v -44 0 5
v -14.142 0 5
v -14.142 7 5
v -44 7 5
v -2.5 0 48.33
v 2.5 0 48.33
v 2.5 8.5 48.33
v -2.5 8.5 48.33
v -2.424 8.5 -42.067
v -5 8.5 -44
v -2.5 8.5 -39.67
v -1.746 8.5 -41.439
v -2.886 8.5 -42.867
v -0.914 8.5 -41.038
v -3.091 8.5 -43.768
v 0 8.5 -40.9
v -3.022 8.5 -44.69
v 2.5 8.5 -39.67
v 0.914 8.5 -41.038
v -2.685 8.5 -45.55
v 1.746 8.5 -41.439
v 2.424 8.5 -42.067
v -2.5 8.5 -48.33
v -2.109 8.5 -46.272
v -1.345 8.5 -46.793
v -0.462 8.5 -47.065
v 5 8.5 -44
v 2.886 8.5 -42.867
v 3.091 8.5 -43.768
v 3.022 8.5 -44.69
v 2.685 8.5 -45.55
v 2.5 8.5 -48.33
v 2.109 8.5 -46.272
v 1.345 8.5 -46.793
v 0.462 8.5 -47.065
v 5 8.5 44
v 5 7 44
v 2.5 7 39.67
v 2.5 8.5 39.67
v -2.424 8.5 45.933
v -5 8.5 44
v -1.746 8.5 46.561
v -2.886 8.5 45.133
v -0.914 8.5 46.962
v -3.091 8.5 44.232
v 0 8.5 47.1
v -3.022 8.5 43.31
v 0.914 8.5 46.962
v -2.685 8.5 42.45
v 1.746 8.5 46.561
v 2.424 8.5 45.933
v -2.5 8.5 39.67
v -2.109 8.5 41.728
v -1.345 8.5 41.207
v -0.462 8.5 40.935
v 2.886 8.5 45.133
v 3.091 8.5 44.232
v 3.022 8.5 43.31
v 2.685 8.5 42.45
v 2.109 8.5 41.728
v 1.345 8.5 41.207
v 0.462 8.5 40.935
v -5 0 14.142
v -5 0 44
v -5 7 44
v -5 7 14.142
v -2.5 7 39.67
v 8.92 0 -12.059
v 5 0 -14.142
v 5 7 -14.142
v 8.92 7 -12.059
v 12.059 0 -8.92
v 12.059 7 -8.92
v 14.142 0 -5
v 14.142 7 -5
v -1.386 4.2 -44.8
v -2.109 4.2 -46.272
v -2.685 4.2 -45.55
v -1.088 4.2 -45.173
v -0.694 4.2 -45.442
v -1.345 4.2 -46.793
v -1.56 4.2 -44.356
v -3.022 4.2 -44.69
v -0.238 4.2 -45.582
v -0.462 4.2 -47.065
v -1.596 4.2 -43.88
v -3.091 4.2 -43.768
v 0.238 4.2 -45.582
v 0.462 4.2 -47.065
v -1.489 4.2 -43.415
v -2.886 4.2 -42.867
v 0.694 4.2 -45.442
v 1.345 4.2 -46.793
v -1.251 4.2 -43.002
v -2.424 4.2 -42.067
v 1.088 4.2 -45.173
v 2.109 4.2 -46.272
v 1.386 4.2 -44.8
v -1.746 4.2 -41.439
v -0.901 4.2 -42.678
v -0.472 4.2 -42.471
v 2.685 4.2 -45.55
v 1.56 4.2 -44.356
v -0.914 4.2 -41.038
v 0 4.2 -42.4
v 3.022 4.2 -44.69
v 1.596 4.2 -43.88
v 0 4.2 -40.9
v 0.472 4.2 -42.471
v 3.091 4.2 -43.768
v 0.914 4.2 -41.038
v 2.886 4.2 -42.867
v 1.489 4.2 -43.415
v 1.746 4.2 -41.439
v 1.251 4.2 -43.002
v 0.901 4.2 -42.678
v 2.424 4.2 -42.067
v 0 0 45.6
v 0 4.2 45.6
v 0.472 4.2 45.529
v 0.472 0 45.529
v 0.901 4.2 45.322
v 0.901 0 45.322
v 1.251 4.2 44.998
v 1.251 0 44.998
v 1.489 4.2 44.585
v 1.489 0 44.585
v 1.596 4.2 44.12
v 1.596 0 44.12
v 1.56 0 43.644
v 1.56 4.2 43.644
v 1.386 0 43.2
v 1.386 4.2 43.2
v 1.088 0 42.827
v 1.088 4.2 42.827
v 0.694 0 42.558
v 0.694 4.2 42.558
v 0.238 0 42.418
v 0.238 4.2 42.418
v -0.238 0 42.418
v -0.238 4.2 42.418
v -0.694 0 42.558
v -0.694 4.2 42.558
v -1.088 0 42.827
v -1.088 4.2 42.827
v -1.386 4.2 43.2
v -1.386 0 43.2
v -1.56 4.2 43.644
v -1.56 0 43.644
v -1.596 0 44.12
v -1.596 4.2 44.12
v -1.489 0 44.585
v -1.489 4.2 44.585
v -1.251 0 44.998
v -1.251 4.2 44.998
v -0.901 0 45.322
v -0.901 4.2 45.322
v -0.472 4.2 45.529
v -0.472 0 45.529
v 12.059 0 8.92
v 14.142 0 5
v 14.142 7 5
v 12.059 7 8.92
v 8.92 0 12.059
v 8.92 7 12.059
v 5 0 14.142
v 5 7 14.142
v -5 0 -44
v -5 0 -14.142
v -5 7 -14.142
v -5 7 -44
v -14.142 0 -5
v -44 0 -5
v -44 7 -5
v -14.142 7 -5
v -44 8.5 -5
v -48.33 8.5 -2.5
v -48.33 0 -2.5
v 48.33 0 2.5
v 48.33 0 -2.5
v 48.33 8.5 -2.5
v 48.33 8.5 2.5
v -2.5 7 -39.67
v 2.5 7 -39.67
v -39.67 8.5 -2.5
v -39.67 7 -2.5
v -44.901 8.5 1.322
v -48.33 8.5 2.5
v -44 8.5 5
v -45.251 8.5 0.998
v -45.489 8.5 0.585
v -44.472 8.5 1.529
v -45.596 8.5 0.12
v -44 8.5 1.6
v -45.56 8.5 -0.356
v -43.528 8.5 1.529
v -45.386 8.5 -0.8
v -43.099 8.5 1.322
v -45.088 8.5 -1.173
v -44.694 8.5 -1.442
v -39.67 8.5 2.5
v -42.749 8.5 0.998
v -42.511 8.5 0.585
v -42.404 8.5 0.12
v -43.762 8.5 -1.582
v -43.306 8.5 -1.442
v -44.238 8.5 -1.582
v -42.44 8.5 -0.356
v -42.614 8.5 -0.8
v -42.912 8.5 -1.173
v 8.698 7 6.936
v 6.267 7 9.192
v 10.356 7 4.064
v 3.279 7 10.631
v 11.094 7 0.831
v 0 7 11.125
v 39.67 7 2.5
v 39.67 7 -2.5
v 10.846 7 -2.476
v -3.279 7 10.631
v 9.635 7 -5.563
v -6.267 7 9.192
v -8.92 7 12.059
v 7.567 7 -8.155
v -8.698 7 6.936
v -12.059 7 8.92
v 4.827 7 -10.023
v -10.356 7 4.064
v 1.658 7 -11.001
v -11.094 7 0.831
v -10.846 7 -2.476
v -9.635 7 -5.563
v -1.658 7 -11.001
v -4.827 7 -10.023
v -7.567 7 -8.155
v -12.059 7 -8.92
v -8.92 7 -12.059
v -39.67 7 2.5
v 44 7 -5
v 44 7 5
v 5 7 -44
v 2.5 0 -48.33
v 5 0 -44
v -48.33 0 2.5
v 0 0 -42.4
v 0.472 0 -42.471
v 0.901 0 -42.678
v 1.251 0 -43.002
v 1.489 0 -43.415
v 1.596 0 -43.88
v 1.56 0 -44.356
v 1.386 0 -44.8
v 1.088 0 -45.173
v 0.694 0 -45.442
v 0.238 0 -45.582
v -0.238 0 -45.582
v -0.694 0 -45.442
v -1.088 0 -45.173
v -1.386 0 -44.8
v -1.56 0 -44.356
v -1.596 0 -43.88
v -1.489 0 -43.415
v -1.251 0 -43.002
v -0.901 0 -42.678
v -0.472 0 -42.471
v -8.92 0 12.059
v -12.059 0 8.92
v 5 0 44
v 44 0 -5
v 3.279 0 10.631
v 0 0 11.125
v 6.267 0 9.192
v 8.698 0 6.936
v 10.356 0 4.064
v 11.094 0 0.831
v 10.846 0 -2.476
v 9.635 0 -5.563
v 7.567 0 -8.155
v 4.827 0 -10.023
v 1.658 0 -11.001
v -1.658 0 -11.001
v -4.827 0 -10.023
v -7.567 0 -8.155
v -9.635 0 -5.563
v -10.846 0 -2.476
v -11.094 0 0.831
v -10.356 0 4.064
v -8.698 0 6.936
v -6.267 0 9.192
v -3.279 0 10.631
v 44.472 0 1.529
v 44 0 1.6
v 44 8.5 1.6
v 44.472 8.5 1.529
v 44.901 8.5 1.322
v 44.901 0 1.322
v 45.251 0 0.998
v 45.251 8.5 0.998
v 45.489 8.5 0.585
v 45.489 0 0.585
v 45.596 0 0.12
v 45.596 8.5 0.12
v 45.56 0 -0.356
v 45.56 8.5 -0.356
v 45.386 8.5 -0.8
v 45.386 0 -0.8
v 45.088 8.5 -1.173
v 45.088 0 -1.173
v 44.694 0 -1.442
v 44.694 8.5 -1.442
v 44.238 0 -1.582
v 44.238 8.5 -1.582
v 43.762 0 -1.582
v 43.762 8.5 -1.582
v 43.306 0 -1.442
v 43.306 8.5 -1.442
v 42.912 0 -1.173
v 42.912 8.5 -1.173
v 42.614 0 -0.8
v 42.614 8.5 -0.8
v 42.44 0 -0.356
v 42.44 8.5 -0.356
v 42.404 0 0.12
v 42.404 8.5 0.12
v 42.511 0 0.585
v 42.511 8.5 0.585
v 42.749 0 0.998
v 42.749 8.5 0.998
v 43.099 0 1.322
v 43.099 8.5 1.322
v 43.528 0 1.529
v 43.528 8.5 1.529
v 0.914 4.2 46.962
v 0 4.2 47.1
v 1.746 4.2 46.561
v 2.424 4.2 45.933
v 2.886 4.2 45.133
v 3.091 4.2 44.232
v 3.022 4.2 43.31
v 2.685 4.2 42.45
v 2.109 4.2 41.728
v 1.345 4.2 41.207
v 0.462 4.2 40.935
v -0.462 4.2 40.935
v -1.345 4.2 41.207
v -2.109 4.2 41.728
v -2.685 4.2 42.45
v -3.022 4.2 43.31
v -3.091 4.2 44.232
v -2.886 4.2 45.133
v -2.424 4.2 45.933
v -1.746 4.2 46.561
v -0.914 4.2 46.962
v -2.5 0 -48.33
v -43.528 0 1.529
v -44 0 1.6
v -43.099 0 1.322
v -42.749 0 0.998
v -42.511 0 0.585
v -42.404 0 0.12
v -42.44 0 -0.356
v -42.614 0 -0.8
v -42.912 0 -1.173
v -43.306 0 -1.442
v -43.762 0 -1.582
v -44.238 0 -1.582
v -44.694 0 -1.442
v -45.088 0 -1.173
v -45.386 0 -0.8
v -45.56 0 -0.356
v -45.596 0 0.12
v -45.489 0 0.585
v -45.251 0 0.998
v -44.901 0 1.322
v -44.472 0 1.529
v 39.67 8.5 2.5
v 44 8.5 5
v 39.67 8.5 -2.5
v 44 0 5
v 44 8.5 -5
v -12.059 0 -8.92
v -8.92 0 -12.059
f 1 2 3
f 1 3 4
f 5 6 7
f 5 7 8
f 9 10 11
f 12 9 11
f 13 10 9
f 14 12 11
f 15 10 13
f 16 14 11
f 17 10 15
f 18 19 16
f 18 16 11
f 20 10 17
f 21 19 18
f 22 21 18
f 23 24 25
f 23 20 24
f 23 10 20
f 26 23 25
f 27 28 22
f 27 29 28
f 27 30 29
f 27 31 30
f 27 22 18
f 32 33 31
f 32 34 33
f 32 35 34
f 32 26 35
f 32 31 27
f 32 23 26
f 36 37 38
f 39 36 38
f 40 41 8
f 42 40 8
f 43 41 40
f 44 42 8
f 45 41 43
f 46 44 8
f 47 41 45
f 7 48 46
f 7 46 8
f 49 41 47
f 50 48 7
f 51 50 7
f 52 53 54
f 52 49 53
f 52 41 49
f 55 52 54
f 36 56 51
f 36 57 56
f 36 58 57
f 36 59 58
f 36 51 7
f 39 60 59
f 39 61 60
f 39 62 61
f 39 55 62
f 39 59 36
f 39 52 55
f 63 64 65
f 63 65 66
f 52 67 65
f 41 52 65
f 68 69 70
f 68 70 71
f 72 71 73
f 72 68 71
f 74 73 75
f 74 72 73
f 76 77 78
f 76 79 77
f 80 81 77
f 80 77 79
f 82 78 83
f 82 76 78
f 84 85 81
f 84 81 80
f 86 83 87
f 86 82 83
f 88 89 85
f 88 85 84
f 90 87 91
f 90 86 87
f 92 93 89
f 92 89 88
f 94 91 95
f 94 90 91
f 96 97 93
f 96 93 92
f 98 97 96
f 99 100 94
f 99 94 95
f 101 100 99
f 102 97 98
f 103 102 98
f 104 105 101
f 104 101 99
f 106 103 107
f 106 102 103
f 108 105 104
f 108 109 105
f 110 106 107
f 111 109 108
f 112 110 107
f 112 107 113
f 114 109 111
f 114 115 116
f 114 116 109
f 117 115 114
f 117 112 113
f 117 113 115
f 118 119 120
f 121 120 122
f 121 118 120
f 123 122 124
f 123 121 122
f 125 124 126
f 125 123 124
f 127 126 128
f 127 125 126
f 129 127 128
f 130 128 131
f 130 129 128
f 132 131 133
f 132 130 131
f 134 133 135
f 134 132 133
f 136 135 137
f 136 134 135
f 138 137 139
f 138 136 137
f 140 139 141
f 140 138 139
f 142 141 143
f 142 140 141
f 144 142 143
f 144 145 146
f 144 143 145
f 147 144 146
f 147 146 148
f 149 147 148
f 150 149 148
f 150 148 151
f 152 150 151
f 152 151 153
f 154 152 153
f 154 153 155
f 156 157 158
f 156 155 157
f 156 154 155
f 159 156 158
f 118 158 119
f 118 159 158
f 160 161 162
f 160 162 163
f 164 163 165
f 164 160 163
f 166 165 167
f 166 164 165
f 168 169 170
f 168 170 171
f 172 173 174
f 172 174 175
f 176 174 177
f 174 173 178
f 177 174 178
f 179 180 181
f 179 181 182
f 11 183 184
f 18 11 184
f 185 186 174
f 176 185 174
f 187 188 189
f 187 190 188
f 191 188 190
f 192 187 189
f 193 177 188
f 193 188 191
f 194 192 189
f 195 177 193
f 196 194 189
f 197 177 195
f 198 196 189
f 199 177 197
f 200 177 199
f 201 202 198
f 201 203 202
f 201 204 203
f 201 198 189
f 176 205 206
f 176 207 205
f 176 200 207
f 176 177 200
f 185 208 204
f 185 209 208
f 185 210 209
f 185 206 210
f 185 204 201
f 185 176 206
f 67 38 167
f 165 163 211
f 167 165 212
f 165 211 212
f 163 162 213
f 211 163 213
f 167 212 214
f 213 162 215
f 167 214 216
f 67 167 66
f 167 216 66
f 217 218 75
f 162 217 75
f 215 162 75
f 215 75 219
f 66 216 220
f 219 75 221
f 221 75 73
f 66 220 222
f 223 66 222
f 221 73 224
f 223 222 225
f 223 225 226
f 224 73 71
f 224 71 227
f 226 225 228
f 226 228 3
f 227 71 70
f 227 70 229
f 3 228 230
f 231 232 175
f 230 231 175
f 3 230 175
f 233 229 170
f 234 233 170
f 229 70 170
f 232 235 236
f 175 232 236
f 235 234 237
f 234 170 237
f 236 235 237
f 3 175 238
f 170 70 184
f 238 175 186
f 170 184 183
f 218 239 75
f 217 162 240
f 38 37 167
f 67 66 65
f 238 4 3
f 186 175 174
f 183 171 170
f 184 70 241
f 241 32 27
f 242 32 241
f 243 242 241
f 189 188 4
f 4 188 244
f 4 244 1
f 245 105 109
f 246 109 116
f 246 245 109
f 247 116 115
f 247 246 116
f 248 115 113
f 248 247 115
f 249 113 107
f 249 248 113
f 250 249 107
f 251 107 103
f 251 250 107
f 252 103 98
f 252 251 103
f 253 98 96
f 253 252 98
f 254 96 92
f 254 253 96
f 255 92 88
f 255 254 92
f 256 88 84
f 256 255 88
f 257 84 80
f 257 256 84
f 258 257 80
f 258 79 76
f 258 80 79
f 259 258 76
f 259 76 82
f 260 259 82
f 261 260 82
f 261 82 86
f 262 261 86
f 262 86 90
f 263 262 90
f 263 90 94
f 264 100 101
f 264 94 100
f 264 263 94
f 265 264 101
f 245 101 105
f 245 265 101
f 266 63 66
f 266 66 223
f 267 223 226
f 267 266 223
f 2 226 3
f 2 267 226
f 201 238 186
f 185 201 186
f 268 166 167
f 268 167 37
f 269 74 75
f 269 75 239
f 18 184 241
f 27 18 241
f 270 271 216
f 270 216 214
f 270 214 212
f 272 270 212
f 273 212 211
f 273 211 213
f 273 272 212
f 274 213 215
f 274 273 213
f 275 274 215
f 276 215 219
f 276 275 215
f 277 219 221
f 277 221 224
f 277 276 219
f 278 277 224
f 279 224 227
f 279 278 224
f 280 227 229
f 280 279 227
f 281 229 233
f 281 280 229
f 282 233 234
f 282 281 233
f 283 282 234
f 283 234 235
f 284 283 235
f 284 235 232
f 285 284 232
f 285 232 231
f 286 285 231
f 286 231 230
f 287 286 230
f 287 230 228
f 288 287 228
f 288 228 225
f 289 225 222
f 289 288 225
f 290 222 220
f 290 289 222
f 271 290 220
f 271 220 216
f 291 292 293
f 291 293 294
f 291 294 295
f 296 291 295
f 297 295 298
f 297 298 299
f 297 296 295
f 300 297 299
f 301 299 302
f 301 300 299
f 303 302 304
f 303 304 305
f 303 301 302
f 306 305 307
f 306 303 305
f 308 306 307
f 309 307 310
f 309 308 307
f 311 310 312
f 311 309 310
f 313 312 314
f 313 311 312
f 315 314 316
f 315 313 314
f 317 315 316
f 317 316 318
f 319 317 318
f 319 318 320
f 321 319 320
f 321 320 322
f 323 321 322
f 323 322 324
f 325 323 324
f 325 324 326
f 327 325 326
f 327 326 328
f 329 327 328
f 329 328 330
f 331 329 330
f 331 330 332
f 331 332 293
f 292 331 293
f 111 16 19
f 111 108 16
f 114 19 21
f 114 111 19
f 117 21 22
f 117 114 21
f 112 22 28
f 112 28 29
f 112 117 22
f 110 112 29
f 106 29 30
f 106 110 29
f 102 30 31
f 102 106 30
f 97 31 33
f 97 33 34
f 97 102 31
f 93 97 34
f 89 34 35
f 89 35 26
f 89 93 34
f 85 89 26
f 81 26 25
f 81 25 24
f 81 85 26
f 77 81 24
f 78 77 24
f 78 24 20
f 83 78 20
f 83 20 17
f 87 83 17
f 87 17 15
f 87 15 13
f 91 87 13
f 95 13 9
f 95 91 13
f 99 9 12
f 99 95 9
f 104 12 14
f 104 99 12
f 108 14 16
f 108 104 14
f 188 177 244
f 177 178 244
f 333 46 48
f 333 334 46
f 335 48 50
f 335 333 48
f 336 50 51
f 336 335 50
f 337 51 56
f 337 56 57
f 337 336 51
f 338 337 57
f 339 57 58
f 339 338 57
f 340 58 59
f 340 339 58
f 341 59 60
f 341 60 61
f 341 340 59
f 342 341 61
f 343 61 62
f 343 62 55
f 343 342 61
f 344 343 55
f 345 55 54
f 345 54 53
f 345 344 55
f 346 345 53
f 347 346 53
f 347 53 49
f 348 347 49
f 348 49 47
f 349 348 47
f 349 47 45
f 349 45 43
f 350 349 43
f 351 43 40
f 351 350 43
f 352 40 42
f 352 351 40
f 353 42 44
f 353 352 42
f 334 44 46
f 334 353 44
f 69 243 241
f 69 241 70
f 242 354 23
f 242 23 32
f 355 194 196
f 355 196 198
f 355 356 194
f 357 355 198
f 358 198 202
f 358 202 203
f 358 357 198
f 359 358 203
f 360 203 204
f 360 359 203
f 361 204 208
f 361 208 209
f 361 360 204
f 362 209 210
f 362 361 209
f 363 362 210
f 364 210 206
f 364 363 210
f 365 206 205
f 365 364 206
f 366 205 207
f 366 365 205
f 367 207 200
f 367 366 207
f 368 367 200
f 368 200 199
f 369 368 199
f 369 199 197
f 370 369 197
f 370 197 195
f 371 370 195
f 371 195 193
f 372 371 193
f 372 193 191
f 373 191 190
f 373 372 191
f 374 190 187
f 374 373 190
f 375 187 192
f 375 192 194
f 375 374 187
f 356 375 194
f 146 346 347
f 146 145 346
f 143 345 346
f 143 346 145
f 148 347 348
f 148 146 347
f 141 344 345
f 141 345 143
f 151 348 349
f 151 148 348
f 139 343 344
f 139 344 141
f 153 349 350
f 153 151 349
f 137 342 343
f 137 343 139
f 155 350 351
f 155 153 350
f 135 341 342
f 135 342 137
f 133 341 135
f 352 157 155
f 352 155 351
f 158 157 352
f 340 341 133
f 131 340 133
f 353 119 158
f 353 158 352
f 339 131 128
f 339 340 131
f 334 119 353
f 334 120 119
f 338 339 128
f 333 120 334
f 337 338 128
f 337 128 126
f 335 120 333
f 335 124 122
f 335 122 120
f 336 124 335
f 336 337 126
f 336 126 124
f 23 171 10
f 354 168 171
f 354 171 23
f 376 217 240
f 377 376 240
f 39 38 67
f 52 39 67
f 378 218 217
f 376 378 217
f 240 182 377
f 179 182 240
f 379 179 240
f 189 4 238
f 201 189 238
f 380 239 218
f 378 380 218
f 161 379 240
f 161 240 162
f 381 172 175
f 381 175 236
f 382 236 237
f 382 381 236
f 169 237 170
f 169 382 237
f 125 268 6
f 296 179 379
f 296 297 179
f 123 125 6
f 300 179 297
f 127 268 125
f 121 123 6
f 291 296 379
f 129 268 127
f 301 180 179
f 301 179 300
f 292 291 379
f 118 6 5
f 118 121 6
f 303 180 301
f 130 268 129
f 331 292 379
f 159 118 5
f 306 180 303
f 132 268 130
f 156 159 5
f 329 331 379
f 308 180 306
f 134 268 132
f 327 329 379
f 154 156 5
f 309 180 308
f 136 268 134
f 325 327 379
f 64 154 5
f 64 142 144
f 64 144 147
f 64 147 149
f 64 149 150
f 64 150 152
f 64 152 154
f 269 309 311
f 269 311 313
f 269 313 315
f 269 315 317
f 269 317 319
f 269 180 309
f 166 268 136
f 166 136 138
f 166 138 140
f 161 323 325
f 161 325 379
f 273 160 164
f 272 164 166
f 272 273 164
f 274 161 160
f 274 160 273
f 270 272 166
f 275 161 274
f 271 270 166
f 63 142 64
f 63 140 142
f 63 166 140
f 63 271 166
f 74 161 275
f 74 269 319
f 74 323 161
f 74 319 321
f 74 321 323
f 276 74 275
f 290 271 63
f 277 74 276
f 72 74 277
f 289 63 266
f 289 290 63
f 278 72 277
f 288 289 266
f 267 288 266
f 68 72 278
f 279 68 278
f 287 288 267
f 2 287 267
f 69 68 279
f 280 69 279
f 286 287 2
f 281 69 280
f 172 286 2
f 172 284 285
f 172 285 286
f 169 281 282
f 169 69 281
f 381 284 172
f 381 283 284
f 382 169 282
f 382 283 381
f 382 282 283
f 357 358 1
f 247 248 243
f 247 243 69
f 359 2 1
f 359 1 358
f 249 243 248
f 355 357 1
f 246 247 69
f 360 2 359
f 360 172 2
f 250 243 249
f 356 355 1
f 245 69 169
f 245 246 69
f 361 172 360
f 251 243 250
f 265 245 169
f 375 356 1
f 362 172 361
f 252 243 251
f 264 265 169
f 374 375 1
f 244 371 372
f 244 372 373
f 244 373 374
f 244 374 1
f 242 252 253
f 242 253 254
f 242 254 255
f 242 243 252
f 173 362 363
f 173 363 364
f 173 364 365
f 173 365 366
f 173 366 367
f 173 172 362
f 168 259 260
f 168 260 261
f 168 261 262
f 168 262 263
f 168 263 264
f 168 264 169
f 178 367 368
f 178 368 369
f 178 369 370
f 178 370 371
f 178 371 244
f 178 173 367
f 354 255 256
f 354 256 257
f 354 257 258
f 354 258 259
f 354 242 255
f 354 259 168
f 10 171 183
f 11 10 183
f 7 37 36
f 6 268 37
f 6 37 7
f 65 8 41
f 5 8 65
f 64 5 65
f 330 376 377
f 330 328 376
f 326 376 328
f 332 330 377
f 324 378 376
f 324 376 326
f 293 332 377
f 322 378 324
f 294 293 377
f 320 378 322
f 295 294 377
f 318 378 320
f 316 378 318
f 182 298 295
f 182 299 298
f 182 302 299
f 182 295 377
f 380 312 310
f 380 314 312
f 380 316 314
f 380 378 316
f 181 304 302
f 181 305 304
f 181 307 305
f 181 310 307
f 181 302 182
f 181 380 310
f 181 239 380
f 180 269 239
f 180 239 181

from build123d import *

# Parameters (mm, degrees)
SKETCH1_R           = 11.125
SKETCH1_R_2         = 1.6
BOSS_EXTRUDE1_DEPTH = 7
SKETCH3_R           = 3.1
CUT_EXTRUDE1_DEPTH  = 2.8
SKETCH2_R           = 1.6
SKETCH2_R_2         = 3.1
BOSS_EXTRUDE2_DEPTH = 1.5


with BuildPart() as part:
    # Sketch1 → Boss-Extrude1 (new body)
    with BuildSketch(Plane(origin=(0, 0, 0), x_dir=(1, 0, 0), z_dir=(0, 1, 0))):
        with BuildLine():
            Line((44, 5), (48.330127019, 2.5))
            Line((48.330127019, 2.5), (48.330127019, -2.5))
            Line((48.330127019, -2.5), (44, -5))
            Line((44, -5), (14.142135624, -5))
            ThreePointArc((14.142135624, -5), (10.606601718, -10.606601718), (5, -14.142135624))
            Line((5, -14.142135624), (5, -44))
            Line((5, -44), (2.5, -48.330127019))
            Line((2.5, -48.330127019), (-2.5, -48.330127019))
            Line((-2.5, -48.330127019), (-5, -44))
            Line((-5, -44), (-5, -14.142135624))
            ThreePointArc((-5, -14.142135624), (-10.606601718, -10.606601718), (-14.142135624, -5))
            Line((-14.142135624, -5), (-44, -5))
            Line((-44, -5), (-48.330127019, -2.5))
            Line((-48.330127019, -2.5), (-48.330127019, 2.5))
            Line((-48.330127019, 2.5), (-44, 5))
            Line((-44, 5), (-14.142135624, 5))
            ThreePointArc((-14.142135624, 5), (-10.606601718, 10.606601718), (-5, 14.142135624))
            Line((-5, 14.142135624), (-5, 44))
            Line((-5, 44), (-2.5, 48.330127019))
            Line((-2.5, 48.330127019), (2.5, 48.330127019))
            Line((2.5, 48.330127019), (5, 44))
            Line((5, 44), (5, 14.142135624))
            ThreePointArc((5, 14.142135624), (10.606601718, 10.606601718), (14.142135624, 5))
            Line((14.142135624, 5), (44, 5))
        make_face()
        with Locations(Location((0, 0, 0), (0, 0, 270))):
            Circle(SKETCH1_R, mode=Mode.SUBTRACT)
        with Locations(Location((44, 0, 0), (0, 0, 270))):
            Circle(SKETCH1_R_2, mode=Mode.SUBTRACT)
        with Locations(Location((0, 44, 0), (0, 0, 270))):
            Circle(SKETCH1_R_2, mode=Mode.SUBTRACT)
        with Locations(Location((-44, 0, 0), (0, 0, 270))):
            Circle(SKETCH1_R_2, mode=Mode.SUBTRACT)
        with Locations(Location((0, -44, 0), (0, 0, 270))):
            Circle(SKETCH1_R_2, mode=Mode.SUBTRACT)
    extrude(amount=BOSS_EXTRUDE1_DEPTH)

    # Sketch3 → Cut-Extrude1 (cut)
    with BuildSketch(Plane(origin=(0, 7, 0), x_dir=(1, 0, 0), z_dir=(0, 1, 0))):
        with Locations(Location((0, 44, 0), (0, 0, 270))):
            Circle(SKETCH3_R)
        with Locations(Location((0, -44, 0), (0, 0, 270))):
            Circle(SKETCH3_R)
    extrude(amount=-CUT_EXTRUDE1_DEPTH, mode=Mode.SUBTRACT)

    # Sketch2 → Boss-Extrude2 (add)
    # profile 1 of 4: a face of its own
    with BuildSketch(Plane(origin=(0, 7, 0), x_dir=(1, 0, 0), z_dir=(0, 1, 0))):
        Polygon((-44, 5), (-48.330127019, 2.5), (-48.330127019, -2.5), (-44, -5), (-39.669872981, -2.5), (-39.669872981, 2.5), align=None)
        with Locations(Location((-44, 0, 0), (0, 0, 270))):
            Circle(SKETCH2_R, mode=Mode.SUBTRACT)
    # profile 2 of 4: a face of its own
    with BuildSketch(Plane(origin=(0, 7, 0), x_dir=(1, 0, 0), z_dir=(0, 1, 0))):
        Polygon((48.330127019, 2.5), (44, 5), (39.669872981, 2.5), (39.669872981, -2.5), (44, -5), (48.330127019, -2.5), align=None)
        with Locations(Location((44, 0, 0), (0, 0, 270))):
            Circle(SKETCH2_R, mode=Mode.SUBTRACT)
    # profile 3 of 4: a face of its own
    with BuildSketch(Plane(origin=(0, 7, 0), x_dir=(1, 0, 0), z_dir=(0, 1, 0))):
        Polygon((2.5, 48.330127019), (-2.5, 48.330127019), (-5, 44), (-2.5, 39.669872981), (2.5, 39.669872981), (5, 44), align=None)
        with Locations(Location((0, 44, 0), (0, 0, 270))):
            Circle(SKETCH2_R_2, mode=Mode.SUBTRACT)
    # profile 4 of 4: a face of its own
    with BuildSketch(Plane(origin=(0, 7, 0), x_dir=(1, 0, 0), z_dir=(0, 1, 0))):
        Polygon((-2.5, -48.330127019), (2.5, -48.330127019), (5, -44), (2.5, -39.669872981), (-2.5, -39.669872981), (-5, -44), align=None)
        with Locations(Location((0, -44, 0), (0, 0, 270))):
            Circle(SKETCH2_R_2, mode=Mode.SUBTRACT)
    extrude(amount=BOSS_EXTRUDE2_DEPTH)


solid = part.part
